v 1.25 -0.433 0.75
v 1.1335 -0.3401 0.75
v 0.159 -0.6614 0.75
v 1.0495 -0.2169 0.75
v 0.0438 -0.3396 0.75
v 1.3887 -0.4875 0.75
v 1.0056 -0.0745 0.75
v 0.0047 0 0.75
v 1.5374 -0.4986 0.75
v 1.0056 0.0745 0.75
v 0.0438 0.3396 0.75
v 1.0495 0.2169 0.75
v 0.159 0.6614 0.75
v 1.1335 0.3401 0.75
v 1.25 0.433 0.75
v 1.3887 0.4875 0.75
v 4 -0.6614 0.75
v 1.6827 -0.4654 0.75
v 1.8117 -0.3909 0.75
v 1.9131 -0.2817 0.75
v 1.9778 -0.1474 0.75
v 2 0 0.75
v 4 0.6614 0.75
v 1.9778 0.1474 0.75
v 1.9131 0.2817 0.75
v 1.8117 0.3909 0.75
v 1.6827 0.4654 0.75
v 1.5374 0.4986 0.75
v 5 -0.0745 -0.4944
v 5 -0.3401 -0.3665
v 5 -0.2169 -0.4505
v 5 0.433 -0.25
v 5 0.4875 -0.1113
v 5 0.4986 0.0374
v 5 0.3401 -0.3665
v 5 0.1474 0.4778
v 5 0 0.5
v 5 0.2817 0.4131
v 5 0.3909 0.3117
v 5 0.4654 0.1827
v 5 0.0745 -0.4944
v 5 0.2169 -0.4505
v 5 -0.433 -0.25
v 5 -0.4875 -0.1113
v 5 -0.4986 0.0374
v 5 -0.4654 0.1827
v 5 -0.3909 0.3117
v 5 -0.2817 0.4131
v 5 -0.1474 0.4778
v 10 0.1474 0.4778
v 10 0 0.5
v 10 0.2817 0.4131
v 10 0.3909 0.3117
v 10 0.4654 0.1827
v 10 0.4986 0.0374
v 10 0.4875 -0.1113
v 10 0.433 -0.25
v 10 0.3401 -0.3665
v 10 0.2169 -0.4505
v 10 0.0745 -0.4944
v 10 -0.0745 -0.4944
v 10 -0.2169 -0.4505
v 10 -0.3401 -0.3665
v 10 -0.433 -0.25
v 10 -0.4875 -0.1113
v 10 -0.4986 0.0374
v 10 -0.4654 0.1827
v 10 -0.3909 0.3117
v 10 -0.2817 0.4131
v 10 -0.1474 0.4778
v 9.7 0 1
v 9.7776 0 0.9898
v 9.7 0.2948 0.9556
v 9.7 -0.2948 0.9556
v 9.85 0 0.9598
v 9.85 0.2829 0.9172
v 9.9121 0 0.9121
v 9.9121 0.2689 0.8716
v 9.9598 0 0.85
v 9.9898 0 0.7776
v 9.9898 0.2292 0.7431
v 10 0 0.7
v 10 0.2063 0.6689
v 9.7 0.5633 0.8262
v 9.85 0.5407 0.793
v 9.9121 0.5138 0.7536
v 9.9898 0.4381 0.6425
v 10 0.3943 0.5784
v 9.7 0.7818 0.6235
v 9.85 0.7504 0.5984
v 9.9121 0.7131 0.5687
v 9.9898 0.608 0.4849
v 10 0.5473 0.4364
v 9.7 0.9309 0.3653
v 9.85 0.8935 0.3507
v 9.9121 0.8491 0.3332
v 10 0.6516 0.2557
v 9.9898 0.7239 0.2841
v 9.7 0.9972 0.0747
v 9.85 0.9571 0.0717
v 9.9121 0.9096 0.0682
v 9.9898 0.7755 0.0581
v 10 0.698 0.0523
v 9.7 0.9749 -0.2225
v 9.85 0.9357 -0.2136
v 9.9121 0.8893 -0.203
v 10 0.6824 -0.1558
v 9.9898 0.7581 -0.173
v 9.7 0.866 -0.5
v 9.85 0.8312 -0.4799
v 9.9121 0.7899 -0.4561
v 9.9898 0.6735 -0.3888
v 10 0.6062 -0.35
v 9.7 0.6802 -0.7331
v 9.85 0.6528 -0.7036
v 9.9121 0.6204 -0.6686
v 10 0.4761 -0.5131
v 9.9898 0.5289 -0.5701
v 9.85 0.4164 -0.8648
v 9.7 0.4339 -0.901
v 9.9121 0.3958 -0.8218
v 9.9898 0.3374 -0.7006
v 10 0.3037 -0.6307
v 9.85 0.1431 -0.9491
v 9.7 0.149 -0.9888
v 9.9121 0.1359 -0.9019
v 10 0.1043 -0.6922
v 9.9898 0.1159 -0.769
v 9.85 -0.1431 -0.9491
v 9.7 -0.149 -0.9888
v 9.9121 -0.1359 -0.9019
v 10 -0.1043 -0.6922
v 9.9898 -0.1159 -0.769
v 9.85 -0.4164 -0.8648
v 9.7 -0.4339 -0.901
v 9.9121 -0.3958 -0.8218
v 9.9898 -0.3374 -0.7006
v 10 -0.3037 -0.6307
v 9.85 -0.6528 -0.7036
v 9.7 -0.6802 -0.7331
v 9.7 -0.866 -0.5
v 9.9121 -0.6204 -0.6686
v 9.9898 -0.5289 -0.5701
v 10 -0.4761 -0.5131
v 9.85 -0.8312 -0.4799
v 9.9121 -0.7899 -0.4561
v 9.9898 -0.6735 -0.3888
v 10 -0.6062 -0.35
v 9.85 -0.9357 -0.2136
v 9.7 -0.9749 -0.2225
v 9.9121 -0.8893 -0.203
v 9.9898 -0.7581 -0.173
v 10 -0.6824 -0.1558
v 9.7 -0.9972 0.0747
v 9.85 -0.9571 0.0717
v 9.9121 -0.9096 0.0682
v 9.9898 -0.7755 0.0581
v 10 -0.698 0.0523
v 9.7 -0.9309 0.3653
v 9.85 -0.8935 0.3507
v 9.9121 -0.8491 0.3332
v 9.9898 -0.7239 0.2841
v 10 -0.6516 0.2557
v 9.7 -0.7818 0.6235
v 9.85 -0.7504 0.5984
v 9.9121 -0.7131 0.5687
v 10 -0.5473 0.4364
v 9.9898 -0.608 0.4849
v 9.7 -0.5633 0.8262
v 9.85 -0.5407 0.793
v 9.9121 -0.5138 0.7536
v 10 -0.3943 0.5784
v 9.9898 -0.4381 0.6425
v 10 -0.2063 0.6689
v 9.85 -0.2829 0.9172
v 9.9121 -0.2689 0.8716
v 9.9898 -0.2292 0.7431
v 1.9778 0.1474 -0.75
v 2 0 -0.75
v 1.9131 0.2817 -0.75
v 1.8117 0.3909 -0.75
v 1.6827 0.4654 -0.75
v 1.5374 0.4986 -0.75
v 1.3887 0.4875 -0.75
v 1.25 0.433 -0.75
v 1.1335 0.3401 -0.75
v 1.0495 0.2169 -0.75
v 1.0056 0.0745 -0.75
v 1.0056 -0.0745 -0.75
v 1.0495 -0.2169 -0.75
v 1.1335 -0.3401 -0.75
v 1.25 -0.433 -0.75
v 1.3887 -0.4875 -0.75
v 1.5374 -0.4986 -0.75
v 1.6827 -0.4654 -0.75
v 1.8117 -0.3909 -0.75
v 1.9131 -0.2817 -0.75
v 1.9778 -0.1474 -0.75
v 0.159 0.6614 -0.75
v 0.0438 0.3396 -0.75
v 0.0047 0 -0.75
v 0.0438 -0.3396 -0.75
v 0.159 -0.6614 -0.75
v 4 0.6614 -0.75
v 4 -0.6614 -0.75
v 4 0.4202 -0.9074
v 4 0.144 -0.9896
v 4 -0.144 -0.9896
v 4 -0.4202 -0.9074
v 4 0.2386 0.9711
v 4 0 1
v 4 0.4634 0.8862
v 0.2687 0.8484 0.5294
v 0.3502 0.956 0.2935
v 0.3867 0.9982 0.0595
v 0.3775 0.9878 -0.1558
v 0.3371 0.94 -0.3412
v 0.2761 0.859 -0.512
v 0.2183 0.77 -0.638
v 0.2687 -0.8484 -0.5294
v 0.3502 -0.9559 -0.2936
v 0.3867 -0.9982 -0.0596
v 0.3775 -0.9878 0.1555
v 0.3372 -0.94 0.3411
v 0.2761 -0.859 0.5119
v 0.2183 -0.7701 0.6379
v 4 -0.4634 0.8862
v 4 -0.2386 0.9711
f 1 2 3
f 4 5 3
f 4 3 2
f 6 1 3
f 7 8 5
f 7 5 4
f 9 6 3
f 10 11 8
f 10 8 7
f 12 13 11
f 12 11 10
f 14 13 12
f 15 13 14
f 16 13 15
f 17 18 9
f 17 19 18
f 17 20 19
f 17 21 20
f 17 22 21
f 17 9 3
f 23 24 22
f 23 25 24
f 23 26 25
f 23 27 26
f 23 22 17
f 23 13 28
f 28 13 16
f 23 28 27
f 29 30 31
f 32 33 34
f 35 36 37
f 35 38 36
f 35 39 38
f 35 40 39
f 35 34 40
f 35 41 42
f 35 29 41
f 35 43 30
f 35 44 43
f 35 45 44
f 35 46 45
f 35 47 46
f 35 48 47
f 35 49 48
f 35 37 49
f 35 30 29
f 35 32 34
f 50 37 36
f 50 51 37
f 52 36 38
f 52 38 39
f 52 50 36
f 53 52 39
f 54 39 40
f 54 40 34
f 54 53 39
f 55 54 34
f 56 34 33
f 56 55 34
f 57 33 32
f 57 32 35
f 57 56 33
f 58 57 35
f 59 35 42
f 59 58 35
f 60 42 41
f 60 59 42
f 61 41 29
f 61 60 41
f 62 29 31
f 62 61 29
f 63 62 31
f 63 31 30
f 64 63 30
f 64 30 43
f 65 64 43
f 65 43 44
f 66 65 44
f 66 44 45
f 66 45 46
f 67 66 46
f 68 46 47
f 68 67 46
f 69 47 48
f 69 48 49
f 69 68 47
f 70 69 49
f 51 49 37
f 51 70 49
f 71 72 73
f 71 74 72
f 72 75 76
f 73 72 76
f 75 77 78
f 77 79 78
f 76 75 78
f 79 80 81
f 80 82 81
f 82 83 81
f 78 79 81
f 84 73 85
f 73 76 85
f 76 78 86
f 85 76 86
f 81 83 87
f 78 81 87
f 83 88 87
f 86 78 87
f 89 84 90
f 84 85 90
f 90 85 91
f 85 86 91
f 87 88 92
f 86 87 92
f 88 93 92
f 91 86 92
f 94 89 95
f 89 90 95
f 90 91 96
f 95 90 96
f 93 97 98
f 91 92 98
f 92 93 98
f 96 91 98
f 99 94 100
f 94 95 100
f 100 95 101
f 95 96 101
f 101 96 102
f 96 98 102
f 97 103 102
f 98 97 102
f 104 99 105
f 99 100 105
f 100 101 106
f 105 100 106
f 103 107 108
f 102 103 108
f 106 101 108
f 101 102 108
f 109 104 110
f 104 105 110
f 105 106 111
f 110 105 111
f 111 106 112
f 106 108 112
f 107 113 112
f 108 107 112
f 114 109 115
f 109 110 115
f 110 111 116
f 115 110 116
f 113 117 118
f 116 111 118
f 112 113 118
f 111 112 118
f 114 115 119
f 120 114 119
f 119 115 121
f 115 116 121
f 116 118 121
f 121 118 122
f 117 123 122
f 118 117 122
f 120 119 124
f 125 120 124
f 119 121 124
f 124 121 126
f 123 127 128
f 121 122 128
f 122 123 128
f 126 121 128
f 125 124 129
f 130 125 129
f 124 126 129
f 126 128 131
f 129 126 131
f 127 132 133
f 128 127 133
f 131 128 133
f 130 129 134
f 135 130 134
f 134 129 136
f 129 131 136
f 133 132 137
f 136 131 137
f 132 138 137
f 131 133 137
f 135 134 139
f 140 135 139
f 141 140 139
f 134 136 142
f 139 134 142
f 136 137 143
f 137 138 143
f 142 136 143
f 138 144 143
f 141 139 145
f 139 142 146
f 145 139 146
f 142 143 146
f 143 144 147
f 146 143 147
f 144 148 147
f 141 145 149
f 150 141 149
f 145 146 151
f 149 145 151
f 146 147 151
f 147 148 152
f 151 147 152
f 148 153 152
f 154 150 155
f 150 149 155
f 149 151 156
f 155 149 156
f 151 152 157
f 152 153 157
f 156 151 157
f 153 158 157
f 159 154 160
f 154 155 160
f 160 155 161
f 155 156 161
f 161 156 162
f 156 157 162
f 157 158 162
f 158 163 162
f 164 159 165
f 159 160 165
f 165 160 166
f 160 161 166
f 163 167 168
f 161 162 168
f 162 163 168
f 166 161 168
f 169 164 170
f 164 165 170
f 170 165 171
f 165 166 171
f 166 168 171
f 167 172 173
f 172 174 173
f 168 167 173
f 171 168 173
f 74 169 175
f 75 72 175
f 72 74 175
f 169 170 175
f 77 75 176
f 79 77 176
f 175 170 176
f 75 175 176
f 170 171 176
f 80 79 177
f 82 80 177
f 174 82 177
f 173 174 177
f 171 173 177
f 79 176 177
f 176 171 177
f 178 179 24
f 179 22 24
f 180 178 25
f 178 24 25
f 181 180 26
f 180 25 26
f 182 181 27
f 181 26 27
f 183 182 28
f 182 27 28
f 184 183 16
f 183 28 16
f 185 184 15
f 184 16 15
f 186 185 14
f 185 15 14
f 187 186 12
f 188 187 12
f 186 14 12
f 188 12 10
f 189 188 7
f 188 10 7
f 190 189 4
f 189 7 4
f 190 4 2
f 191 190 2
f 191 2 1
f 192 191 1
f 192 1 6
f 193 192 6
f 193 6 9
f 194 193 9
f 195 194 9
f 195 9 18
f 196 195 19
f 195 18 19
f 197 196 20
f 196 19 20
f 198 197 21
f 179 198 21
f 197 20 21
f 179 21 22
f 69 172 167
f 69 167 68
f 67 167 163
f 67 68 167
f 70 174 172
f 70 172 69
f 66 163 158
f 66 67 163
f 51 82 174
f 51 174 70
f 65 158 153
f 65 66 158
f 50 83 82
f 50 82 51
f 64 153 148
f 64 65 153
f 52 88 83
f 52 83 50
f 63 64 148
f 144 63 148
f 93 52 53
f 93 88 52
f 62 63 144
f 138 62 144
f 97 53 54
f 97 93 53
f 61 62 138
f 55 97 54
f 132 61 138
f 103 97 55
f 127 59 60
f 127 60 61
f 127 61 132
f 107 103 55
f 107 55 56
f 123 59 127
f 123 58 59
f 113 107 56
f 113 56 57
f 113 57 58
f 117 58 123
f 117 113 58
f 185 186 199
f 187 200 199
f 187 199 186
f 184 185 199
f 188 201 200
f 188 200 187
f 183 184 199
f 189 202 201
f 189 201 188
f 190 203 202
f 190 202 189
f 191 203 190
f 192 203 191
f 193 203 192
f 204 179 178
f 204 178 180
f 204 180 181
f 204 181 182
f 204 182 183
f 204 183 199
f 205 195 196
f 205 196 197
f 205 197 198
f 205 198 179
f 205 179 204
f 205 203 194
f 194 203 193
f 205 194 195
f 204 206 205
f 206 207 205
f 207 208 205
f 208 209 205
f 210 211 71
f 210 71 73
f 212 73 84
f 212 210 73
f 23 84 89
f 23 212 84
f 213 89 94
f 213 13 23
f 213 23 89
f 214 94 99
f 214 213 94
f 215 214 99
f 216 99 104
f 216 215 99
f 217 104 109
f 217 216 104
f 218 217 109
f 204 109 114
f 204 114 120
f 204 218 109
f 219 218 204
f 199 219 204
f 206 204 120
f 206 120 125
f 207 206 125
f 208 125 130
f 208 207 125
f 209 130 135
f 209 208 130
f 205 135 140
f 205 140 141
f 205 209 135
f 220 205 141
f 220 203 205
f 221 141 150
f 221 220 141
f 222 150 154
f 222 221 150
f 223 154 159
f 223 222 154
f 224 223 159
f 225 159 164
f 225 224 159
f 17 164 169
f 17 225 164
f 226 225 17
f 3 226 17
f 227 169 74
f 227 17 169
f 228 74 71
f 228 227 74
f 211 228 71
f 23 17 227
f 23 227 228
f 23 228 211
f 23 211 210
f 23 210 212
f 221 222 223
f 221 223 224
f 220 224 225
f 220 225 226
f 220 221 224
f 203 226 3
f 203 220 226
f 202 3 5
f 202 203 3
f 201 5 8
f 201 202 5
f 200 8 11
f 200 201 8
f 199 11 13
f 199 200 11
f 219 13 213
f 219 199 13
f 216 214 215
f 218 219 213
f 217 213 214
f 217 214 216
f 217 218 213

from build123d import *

# Parameters (mm, degrees)
F2_W     = 4
F2_H     = 0.3307065285
F3_DEPTH = 12.5
F4_R     = 0.5
F5_DEPTH = 12.5
F6_R     = 0.3


with BuildPart() as f1:
    # F0 (on Front) → F1 (revolve)
    with BuildSketch(Plane.XZ):
        Polygon((0, 1), (0, 0), (5, 0), (5, 0.5), (10, 0.5), (10, 1), align=None)
    revolve(axis=Axis((2.5, 0, 0), (-1, 0, 0)))

    # F2 (on Front) → F3 (cut, symmetric)
    with BuildSketch(Plane.XZ):
        with Locations((2, 0.9153532643)):
            Rectangle(F2_W, F2_H)
        with Locations((2, -0.9153532643)):
            Rectangle(F2_W, F2_H)
    extrude(amount=F3_DEPTH, both=True, mode=Mode.SUBTRACT)

    # F4 (on Top) → F5 (cut, symmetric)
    with BuildSketch(Plane.XY):
        with BuildLine():
            Line((-0.3413671802, -1.1073484784), (0.495219545, -1.1073484784))
            ThreePointArc((0.495219545, -1.1073484784), (0.1759867726, -0.6948333534), (0.0178750956, -0.197762947))
            ThreePointArc((0.0178750956, -0.197762947), (0.0047393487, 0), (0.0178750956, 0.197762947))
            ThreePointArc((0.0178750956, 0.197762947), (0.1759867726, 0.6948333534), (0.495219545, 1.1073484784))
            Line((0.495219545, 1.1073484784), (-0.3413671802, 1.1073484784))
            Line((-0.3413671802, 1.1073484784), (-0.3413671802, 0))
            Line((-0.3413671802, 0), (-0.3413671802, -1.1073484784))
        make_face()
        with Locations((1.5, 0)):
            Circle(F4_R)
    extrude(amount=F5_DEPTH, both=True, mode=Mode.SUBTRACT)

    # F6
    f6_edges = [f1.edges().sort_by_distance(p)[0] for p in [
        (10, 0, -1),
    ]]
    fillet(f6_edges, radius=F6_R)


solid = f1.part
